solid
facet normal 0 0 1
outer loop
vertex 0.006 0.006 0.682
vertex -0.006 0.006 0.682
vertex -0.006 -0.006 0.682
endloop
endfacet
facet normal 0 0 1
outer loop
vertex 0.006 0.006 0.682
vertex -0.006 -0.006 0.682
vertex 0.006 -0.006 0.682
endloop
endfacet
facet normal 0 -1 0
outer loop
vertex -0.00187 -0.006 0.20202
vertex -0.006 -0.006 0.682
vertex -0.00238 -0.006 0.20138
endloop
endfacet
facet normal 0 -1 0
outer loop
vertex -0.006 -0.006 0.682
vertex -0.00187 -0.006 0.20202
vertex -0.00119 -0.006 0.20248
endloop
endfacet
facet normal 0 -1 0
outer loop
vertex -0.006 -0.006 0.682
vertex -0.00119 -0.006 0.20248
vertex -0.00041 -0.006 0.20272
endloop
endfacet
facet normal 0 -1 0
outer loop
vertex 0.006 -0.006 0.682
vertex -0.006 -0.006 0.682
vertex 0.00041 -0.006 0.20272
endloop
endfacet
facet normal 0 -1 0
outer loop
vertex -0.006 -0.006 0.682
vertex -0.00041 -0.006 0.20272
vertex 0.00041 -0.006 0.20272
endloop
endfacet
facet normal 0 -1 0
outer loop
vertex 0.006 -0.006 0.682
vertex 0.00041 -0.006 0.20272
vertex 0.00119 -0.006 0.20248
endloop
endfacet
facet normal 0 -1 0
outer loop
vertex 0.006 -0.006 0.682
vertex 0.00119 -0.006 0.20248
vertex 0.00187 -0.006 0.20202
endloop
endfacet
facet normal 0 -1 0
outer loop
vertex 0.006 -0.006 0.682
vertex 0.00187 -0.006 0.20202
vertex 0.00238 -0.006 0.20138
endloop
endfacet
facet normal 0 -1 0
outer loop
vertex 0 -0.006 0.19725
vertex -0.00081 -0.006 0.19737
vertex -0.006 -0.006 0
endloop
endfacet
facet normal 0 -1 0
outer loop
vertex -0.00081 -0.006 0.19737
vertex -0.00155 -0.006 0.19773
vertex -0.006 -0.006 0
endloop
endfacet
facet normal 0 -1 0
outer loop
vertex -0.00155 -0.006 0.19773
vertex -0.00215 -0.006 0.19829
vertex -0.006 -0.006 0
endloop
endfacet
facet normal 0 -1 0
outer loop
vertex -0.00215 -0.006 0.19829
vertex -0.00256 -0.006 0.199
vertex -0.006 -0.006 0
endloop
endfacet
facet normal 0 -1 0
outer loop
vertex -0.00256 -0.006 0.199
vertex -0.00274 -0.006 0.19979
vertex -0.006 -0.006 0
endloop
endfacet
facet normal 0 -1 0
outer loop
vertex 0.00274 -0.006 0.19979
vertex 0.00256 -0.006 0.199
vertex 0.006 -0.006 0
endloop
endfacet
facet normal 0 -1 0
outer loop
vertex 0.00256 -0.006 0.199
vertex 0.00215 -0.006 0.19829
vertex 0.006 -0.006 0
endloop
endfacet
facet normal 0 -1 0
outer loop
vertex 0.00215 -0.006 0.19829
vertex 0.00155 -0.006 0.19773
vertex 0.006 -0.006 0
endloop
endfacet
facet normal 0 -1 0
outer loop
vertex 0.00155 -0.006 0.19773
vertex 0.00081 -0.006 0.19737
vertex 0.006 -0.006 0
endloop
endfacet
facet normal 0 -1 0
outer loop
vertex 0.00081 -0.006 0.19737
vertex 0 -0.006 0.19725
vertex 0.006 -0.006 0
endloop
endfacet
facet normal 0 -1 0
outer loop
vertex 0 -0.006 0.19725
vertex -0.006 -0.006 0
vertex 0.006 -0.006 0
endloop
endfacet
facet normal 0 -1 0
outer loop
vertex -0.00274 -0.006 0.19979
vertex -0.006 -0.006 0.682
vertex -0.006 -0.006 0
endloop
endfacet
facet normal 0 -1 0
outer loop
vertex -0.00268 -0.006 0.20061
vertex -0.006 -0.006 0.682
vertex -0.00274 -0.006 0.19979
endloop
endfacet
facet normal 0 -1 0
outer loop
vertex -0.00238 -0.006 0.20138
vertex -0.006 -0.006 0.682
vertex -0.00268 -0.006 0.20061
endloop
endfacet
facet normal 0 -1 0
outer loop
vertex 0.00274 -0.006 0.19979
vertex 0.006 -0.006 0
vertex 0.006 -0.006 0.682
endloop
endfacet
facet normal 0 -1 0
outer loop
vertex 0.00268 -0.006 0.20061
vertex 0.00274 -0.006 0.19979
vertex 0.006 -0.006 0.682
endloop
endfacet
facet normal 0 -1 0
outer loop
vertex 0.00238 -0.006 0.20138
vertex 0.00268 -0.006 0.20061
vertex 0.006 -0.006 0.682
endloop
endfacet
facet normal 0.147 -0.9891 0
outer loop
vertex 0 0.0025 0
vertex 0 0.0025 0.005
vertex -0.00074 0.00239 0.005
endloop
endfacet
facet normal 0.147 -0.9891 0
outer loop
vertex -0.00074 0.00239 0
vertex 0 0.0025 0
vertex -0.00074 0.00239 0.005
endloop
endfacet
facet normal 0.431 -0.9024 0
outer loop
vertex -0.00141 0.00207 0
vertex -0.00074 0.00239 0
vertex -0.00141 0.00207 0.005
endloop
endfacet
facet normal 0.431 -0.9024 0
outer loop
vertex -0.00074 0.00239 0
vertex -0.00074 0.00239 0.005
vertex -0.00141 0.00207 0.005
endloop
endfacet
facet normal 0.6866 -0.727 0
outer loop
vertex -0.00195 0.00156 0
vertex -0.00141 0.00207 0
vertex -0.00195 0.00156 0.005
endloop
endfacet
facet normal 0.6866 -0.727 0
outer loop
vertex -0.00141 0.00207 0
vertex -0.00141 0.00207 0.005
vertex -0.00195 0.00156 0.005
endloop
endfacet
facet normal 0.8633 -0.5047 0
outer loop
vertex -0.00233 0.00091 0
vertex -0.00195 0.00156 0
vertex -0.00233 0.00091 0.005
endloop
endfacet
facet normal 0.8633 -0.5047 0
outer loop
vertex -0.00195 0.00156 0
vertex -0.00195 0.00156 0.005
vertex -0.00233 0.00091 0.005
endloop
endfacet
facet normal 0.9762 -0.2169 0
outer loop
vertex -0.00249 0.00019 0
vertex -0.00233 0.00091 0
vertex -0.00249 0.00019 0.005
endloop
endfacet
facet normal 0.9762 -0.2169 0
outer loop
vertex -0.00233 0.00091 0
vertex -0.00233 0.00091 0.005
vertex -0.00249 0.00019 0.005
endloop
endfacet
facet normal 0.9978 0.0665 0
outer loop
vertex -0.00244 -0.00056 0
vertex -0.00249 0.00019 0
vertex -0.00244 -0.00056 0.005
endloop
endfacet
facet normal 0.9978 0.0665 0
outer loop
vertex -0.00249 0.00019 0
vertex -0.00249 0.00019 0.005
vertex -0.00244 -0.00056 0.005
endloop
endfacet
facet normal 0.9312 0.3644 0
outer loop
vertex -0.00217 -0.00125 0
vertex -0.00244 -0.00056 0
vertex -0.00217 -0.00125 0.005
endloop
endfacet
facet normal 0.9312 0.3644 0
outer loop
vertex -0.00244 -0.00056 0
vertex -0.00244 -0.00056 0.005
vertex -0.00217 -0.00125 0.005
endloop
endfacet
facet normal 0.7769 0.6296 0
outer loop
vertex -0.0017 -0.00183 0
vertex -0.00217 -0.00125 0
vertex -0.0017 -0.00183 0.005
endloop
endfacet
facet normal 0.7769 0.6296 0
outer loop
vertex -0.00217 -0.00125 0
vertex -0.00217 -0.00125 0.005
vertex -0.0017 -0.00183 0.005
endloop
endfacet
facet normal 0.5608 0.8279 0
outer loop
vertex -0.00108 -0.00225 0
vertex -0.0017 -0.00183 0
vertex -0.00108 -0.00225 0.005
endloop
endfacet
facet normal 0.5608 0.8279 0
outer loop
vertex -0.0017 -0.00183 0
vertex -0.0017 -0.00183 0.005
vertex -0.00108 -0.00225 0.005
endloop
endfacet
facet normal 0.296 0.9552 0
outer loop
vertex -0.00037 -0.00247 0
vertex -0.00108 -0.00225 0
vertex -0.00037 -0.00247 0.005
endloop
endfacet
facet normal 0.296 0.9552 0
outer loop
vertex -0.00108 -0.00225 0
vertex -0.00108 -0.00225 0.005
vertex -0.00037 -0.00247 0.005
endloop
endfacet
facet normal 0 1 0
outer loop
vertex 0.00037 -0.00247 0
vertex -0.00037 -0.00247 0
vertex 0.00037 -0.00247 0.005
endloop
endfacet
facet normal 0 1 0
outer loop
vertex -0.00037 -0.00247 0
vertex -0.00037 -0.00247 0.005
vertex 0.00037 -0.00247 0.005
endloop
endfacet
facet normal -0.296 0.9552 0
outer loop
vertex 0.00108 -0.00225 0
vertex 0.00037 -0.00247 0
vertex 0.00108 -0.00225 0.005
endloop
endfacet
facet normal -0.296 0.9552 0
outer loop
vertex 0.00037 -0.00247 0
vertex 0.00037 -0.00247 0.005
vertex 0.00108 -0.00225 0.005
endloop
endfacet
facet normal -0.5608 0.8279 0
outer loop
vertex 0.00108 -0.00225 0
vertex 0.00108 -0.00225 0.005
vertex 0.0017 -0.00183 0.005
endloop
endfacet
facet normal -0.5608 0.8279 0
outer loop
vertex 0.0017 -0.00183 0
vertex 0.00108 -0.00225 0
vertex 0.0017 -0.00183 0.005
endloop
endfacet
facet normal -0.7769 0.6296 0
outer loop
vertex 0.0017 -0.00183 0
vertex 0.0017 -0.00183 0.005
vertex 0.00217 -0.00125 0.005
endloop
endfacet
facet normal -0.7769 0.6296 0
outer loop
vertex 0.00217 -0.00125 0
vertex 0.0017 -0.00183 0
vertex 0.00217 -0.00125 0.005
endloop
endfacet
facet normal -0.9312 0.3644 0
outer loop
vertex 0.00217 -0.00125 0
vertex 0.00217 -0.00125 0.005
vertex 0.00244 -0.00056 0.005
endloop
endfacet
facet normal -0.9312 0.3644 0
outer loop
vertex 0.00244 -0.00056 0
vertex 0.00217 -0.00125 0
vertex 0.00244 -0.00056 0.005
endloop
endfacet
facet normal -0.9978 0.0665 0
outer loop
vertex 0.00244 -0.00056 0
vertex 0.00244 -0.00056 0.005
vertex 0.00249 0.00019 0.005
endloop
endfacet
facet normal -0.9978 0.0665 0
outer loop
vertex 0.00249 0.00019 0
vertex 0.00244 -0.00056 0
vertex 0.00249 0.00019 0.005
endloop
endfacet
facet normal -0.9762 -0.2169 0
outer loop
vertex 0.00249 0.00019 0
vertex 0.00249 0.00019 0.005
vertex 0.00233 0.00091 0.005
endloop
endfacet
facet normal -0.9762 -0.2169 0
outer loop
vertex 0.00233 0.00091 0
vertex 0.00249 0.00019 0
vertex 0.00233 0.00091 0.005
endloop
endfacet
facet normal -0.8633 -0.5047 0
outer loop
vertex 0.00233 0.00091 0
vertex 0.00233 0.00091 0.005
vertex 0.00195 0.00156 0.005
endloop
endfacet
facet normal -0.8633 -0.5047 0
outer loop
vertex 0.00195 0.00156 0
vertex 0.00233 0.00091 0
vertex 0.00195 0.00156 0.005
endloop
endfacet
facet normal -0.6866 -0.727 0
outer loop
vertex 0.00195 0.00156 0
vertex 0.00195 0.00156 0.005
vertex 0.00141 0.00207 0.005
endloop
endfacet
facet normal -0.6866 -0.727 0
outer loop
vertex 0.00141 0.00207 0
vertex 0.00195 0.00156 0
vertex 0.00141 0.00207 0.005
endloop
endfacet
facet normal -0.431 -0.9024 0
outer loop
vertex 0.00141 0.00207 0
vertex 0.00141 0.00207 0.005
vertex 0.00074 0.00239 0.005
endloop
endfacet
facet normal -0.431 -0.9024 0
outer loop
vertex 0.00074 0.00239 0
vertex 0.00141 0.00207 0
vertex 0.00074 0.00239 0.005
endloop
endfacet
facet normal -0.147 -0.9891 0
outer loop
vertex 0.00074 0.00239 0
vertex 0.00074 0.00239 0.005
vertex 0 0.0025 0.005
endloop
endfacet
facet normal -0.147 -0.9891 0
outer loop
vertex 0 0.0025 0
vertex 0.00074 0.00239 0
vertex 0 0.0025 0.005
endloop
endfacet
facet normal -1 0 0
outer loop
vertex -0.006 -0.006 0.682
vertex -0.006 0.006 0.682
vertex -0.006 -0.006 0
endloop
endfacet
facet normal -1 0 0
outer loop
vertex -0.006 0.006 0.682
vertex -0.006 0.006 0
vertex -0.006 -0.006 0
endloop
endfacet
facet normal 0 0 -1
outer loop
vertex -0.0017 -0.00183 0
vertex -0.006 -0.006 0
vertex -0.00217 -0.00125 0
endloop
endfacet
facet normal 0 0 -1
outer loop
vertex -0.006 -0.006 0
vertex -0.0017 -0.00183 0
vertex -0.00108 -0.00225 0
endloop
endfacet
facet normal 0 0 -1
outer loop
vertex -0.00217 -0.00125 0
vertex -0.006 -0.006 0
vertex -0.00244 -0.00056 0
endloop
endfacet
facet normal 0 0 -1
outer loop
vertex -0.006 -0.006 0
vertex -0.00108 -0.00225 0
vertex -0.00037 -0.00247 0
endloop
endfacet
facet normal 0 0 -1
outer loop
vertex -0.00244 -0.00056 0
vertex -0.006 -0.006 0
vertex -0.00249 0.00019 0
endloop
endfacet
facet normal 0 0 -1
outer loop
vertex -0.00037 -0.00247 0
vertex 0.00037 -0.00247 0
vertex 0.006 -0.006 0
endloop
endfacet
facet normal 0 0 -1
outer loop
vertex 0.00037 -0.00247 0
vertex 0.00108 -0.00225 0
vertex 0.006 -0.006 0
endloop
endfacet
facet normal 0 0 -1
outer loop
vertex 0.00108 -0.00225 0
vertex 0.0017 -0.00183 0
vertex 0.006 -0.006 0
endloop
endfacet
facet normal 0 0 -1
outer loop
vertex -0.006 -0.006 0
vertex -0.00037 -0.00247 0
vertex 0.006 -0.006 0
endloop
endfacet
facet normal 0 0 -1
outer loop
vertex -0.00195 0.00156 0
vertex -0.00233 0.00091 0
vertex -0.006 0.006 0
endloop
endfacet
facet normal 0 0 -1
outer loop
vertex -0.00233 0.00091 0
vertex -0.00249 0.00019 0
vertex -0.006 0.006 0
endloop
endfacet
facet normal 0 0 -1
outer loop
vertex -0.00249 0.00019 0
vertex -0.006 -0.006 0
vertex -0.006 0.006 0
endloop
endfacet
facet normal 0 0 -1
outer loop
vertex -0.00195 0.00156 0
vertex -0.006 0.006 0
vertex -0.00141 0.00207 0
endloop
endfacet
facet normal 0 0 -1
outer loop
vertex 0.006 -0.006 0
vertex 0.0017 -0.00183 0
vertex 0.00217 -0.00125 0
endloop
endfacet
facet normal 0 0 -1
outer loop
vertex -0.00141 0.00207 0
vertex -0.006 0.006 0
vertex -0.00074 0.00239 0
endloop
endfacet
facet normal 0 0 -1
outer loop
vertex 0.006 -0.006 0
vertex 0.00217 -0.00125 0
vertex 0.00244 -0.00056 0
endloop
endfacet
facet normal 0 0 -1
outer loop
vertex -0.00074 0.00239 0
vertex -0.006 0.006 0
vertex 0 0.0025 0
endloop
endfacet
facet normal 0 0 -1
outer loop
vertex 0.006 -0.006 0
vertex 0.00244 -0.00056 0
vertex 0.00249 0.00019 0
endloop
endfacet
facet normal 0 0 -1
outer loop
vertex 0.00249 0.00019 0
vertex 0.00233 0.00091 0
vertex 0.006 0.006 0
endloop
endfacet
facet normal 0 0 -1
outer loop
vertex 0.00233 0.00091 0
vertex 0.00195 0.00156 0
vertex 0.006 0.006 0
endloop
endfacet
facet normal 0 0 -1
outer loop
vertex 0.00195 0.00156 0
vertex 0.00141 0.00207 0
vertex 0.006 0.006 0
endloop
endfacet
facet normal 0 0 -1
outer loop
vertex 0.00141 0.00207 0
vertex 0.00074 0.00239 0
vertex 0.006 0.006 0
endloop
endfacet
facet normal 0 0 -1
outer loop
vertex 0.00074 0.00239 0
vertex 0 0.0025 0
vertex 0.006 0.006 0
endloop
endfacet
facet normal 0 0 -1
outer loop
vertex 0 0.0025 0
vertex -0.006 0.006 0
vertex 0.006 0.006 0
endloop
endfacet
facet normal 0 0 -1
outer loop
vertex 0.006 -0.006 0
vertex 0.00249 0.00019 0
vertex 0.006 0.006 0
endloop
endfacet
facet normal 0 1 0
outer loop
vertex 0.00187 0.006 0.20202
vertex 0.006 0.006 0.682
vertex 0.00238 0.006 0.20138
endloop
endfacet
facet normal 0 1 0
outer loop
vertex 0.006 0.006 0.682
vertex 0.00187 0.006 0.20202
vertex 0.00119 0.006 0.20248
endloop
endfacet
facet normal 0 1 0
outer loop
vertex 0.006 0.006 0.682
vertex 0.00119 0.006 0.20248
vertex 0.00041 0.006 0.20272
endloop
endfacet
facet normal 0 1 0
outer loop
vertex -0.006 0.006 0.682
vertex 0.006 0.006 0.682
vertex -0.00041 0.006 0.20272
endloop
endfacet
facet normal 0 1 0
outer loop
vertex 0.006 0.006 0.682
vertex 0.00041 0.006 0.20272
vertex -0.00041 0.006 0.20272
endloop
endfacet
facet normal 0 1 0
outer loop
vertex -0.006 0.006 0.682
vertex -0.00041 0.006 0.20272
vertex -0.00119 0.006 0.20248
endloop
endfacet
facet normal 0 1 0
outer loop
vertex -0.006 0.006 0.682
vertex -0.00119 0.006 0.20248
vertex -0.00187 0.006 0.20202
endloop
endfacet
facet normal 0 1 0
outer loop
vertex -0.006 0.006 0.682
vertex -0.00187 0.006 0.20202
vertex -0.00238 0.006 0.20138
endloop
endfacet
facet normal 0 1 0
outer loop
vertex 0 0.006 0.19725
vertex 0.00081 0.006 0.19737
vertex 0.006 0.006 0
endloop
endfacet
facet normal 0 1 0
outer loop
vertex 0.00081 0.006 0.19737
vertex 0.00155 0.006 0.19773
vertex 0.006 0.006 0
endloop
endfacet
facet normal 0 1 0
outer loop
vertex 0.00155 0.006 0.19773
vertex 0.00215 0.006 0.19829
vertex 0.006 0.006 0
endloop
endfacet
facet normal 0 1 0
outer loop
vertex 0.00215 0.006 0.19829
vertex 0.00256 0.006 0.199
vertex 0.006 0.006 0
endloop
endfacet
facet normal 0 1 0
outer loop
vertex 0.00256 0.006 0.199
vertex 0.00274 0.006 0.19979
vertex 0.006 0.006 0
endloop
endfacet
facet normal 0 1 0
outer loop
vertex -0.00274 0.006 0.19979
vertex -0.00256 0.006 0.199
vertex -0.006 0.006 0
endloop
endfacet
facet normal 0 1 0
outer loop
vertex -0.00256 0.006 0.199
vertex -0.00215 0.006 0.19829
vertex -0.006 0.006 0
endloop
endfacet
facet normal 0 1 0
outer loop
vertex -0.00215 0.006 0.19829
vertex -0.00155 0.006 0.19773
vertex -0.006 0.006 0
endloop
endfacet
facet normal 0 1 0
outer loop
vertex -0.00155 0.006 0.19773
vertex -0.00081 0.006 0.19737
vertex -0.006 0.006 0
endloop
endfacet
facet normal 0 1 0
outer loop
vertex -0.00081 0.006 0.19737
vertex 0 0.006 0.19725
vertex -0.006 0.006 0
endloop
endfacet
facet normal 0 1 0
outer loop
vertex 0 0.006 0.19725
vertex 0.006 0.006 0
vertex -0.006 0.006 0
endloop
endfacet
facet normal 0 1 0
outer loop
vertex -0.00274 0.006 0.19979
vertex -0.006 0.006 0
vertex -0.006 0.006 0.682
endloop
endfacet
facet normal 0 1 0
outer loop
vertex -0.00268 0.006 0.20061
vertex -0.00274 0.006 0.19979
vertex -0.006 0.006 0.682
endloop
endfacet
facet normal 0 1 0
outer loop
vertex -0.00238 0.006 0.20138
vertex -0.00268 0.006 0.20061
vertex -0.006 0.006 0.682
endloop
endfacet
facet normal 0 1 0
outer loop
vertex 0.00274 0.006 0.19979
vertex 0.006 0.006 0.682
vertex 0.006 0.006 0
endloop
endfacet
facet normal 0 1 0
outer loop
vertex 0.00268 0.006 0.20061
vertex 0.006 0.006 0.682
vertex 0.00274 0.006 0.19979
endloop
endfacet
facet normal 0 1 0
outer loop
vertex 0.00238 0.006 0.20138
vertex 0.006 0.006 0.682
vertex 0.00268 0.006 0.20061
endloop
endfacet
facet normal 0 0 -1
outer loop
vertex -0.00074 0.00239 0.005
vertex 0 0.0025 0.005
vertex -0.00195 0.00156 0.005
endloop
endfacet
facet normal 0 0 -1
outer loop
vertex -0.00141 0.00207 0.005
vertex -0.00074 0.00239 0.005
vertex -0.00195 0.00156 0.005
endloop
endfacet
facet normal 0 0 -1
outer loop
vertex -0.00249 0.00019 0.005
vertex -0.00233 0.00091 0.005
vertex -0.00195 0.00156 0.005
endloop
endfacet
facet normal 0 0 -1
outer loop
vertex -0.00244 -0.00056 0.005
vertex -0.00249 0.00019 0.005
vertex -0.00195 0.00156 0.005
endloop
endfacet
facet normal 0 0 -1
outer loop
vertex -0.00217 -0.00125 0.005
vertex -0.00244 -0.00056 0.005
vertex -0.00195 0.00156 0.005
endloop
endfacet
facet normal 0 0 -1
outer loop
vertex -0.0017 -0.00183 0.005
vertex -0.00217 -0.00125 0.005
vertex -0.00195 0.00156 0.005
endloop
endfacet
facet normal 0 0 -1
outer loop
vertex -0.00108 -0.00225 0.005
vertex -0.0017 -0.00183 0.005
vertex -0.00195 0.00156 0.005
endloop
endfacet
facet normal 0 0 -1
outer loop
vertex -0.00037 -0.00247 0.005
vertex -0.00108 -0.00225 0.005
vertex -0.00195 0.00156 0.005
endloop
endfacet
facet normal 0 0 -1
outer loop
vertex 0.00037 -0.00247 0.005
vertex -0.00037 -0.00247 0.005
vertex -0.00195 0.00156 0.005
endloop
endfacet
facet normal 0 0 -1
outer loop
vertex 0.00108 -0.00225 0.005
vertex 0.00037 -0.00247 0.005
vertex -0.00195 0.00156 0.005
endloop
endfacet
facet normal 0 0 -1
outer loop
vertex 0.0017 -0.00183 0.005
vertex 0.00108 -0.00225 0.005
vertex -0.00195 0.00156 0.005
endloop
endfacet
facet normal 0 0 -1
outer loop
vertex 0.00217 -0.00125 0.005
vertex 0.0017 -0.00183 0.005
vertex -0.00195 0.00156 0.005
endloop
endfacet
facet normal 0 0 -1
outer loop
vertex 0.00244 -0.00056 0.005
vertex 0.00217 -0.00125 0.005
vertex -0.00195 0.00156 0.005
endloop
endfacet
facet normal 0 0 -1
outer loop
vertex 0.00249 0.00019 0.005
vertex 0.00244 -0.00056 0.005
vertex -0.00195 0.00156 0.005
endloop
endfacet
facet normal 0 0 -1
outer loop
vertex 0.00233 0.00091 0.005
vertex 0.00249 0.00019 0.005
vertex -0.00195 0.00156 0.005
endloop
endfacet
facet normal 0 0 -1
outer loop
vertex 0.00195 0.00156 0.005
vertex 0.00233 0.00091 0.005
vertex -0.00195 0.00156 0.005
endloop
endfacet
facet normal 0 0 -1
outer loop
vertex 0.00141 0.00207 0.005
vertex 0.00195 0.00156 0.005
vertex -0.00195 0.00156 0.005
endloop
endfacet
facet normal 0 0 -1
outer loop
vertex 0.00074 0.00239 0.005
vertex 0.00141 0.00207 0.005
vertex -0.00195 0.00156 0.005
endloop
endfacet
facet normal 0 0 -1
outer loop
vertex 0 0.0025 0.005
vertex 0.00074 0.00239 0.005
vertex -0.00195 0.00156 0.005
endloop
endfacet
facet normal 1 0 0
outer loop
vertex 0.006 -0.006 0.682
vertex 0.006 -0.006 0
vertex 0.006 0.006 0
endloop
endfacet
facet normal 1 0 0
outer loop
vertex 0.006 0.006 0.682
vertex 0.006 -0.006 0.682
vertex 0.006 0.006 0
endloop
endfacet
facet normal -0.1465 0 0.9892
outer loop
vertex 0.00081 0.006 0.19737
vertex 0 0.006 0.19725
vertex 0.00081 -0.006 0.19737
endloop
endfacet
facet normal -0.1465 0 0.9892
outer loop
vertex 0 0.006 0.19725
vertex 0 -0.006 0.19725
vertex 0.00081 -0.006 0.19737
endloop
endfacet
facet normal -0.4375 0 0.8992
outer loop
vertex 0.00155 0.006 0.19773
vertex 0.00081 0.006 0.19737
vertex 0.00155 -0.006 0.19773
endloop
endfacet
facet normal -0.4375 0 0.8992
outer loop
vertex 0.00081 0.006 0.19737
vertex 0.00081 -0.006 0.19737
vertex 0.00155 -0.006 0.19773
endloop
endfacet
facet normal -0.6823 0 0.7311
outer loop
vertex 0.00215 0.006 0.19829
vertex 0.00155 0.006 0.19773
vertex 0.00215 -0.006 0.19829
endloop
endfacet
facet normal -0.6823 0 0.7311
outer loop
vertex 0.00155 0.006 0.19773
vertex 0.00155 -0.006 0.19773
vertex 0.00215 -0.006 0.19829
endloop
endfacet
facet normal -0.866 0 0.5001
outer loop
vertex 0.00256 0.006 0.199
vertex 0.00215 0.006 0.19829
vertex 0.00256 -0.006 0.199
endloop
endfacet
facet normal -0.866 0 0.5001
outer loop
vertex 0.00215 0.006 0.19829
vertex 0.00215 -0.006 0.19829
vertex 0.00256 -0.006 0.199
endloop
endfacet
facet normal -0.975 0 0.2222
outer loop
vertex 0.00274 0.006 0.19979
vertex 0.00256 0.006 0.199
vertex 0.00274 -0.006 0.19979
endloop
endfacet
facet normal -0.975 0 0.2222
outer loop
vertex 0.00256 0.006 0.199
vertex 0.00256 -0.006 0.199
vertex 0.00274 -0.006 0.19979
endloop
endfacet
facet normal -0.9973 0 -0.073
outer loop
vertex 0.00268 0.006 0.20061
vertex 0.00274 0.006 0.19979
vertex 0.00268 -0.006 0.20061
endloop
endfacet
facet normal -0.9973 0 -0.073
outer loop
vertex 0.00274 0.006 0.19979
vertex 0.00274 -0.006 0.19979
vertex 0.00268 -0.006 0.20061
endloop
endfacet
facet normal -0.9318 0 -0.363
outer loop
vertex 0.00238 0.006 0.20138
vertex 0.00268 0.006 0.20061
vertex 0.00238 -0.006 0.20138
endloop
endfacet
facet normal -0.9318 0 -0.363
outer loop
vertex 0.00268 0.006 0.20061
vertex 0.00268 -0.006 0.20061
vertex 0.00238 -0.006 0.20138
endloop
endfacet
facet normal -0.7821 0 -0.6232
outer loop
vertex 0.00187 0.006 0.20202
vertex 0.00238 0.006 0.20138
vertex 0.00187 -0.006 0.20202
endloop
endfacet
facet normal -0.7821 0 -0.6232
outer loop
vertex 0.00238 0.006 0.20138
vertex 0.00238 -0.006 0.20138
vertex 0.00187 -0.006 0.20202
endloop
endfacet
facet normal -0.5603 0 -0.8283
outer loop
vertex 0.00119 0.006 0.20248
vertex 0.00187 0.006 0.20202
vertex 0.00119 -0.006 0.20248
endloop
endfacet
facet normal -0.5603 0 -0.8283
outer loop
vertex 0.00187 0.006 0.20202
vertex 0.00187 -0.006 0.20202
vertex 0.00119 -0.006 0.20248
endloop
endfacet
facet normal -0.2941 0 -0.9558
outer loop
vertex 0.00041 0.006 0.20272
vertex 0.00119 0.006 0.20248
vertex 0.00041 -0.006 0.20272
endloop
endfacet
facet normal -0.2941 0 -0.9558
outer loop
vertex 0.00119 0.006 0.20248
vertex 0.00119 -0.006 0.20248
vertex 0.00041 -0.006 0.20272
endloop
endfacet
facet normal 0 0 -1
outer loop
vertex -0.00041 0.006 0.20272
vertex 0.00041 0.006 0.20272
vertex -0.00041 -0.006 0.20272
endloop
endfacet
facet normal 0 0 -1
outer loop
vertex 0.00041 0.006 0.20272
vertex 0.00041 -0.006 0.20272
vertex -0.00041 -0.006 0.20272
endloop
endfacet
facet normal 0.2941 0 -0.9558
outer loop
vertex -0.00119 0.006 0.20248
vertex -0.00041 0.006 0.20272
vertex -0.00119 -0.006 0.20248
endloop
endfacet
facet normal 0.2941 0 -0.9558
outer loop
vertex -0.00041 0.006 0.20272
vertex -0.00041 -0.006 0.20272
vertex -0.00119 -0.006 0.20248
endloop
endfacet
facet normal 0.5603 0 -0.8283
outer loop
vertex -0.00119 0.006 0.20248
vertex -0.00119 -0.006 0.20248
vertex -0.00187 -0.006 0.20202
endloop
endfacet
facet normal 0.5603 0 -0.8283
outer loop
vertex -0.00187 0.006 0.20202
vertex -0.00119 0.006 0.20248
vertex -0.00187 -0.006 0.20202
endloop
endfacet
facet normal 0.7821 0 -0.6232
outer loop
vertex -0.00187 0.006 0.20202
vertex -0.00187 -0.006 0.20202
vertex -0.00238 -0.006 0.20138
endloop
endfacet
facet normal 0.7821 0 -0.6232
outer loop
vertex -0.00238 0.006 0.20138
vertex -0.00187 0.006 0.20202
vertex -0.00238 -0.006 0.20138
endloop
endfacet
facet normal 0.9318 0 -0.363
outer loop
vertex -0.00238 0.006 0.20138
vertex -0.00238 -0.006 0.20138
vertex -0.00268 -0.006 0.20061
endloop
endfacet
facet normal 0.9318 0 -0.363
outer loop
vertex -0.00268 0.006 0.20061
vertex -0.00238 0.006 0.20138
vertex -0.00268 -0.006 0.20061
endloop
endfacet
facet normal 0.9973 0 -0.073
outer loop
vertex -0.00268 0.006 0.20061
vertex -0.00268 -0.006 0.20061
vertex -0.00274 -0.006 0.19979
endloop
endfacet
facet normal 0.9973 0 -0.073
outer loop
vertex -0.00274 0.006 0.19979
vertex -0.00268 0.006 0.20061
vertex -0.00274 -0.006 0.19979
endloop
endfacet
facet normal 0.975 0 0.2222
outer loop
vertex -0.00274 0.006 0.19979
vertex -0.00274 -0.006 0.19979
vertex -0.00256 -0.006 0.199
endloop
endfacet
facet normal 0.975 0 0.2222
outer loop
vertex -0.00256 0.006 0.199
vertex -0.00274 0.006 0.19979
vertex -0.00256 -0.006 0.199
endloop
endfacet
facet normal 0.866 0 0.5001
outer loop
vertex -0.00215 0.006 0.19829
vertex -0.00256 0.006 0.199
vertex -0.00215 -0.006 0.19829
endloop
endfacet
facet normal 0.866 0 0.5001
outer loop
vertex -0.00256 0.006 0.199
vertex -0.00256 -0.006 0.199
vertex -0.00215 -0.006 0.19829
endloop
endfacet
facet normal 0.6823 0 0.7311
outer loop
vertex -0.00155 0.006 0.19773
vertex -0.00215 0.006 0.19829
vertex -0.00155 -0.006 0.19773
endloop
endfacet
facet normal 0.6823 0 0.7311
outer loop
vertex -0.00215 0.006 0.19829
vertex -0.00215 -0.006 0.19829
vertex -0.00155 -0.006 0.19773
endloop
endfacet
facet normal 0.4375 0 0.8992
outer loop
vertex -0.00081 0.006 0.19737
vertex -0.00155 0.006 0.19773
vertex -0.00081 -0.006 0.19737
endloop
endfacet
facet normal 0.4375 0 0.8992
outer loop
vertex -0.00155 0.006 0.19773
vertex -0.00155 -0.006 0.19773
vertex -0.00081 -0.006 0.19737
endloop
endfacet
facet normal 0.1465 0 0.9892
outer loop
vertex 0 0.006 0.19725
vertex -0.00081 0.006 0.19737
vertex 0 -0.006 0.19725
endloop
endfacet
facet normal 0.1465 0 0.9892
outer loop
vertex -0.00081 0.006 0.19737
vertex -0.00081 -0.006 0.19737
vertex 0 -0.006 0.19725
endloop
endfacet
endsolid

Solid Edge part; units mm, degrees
sketch "Sketch1" plane through (0, 0, 0) normal (0, 0, 1) x (1, 0, 0)
  line L0 (-0.006, -0.006) -> (0.006, -0.006)
  line L1 (0.006, -0.006) -> (0.006, 0.006)
  line L2 (0.006, 0.006) -> (-0.006, 0.006)
  line L3 (-0.006, 0.006) -> (-0.006, -0.006)
  dimension "D1" = 0.012
extrude "Protrusion1" add sketch "Sketch1" along normal blind 0.682
hole "Bohrung_1" at (0, -0.006, 0.2) direction (0, 1, 0) diameter 0.0055 end through all
hole "Bohrung_2" at (0, 0, 0) direction (0, 0, 1) diameter 0.005 depth 0.005
